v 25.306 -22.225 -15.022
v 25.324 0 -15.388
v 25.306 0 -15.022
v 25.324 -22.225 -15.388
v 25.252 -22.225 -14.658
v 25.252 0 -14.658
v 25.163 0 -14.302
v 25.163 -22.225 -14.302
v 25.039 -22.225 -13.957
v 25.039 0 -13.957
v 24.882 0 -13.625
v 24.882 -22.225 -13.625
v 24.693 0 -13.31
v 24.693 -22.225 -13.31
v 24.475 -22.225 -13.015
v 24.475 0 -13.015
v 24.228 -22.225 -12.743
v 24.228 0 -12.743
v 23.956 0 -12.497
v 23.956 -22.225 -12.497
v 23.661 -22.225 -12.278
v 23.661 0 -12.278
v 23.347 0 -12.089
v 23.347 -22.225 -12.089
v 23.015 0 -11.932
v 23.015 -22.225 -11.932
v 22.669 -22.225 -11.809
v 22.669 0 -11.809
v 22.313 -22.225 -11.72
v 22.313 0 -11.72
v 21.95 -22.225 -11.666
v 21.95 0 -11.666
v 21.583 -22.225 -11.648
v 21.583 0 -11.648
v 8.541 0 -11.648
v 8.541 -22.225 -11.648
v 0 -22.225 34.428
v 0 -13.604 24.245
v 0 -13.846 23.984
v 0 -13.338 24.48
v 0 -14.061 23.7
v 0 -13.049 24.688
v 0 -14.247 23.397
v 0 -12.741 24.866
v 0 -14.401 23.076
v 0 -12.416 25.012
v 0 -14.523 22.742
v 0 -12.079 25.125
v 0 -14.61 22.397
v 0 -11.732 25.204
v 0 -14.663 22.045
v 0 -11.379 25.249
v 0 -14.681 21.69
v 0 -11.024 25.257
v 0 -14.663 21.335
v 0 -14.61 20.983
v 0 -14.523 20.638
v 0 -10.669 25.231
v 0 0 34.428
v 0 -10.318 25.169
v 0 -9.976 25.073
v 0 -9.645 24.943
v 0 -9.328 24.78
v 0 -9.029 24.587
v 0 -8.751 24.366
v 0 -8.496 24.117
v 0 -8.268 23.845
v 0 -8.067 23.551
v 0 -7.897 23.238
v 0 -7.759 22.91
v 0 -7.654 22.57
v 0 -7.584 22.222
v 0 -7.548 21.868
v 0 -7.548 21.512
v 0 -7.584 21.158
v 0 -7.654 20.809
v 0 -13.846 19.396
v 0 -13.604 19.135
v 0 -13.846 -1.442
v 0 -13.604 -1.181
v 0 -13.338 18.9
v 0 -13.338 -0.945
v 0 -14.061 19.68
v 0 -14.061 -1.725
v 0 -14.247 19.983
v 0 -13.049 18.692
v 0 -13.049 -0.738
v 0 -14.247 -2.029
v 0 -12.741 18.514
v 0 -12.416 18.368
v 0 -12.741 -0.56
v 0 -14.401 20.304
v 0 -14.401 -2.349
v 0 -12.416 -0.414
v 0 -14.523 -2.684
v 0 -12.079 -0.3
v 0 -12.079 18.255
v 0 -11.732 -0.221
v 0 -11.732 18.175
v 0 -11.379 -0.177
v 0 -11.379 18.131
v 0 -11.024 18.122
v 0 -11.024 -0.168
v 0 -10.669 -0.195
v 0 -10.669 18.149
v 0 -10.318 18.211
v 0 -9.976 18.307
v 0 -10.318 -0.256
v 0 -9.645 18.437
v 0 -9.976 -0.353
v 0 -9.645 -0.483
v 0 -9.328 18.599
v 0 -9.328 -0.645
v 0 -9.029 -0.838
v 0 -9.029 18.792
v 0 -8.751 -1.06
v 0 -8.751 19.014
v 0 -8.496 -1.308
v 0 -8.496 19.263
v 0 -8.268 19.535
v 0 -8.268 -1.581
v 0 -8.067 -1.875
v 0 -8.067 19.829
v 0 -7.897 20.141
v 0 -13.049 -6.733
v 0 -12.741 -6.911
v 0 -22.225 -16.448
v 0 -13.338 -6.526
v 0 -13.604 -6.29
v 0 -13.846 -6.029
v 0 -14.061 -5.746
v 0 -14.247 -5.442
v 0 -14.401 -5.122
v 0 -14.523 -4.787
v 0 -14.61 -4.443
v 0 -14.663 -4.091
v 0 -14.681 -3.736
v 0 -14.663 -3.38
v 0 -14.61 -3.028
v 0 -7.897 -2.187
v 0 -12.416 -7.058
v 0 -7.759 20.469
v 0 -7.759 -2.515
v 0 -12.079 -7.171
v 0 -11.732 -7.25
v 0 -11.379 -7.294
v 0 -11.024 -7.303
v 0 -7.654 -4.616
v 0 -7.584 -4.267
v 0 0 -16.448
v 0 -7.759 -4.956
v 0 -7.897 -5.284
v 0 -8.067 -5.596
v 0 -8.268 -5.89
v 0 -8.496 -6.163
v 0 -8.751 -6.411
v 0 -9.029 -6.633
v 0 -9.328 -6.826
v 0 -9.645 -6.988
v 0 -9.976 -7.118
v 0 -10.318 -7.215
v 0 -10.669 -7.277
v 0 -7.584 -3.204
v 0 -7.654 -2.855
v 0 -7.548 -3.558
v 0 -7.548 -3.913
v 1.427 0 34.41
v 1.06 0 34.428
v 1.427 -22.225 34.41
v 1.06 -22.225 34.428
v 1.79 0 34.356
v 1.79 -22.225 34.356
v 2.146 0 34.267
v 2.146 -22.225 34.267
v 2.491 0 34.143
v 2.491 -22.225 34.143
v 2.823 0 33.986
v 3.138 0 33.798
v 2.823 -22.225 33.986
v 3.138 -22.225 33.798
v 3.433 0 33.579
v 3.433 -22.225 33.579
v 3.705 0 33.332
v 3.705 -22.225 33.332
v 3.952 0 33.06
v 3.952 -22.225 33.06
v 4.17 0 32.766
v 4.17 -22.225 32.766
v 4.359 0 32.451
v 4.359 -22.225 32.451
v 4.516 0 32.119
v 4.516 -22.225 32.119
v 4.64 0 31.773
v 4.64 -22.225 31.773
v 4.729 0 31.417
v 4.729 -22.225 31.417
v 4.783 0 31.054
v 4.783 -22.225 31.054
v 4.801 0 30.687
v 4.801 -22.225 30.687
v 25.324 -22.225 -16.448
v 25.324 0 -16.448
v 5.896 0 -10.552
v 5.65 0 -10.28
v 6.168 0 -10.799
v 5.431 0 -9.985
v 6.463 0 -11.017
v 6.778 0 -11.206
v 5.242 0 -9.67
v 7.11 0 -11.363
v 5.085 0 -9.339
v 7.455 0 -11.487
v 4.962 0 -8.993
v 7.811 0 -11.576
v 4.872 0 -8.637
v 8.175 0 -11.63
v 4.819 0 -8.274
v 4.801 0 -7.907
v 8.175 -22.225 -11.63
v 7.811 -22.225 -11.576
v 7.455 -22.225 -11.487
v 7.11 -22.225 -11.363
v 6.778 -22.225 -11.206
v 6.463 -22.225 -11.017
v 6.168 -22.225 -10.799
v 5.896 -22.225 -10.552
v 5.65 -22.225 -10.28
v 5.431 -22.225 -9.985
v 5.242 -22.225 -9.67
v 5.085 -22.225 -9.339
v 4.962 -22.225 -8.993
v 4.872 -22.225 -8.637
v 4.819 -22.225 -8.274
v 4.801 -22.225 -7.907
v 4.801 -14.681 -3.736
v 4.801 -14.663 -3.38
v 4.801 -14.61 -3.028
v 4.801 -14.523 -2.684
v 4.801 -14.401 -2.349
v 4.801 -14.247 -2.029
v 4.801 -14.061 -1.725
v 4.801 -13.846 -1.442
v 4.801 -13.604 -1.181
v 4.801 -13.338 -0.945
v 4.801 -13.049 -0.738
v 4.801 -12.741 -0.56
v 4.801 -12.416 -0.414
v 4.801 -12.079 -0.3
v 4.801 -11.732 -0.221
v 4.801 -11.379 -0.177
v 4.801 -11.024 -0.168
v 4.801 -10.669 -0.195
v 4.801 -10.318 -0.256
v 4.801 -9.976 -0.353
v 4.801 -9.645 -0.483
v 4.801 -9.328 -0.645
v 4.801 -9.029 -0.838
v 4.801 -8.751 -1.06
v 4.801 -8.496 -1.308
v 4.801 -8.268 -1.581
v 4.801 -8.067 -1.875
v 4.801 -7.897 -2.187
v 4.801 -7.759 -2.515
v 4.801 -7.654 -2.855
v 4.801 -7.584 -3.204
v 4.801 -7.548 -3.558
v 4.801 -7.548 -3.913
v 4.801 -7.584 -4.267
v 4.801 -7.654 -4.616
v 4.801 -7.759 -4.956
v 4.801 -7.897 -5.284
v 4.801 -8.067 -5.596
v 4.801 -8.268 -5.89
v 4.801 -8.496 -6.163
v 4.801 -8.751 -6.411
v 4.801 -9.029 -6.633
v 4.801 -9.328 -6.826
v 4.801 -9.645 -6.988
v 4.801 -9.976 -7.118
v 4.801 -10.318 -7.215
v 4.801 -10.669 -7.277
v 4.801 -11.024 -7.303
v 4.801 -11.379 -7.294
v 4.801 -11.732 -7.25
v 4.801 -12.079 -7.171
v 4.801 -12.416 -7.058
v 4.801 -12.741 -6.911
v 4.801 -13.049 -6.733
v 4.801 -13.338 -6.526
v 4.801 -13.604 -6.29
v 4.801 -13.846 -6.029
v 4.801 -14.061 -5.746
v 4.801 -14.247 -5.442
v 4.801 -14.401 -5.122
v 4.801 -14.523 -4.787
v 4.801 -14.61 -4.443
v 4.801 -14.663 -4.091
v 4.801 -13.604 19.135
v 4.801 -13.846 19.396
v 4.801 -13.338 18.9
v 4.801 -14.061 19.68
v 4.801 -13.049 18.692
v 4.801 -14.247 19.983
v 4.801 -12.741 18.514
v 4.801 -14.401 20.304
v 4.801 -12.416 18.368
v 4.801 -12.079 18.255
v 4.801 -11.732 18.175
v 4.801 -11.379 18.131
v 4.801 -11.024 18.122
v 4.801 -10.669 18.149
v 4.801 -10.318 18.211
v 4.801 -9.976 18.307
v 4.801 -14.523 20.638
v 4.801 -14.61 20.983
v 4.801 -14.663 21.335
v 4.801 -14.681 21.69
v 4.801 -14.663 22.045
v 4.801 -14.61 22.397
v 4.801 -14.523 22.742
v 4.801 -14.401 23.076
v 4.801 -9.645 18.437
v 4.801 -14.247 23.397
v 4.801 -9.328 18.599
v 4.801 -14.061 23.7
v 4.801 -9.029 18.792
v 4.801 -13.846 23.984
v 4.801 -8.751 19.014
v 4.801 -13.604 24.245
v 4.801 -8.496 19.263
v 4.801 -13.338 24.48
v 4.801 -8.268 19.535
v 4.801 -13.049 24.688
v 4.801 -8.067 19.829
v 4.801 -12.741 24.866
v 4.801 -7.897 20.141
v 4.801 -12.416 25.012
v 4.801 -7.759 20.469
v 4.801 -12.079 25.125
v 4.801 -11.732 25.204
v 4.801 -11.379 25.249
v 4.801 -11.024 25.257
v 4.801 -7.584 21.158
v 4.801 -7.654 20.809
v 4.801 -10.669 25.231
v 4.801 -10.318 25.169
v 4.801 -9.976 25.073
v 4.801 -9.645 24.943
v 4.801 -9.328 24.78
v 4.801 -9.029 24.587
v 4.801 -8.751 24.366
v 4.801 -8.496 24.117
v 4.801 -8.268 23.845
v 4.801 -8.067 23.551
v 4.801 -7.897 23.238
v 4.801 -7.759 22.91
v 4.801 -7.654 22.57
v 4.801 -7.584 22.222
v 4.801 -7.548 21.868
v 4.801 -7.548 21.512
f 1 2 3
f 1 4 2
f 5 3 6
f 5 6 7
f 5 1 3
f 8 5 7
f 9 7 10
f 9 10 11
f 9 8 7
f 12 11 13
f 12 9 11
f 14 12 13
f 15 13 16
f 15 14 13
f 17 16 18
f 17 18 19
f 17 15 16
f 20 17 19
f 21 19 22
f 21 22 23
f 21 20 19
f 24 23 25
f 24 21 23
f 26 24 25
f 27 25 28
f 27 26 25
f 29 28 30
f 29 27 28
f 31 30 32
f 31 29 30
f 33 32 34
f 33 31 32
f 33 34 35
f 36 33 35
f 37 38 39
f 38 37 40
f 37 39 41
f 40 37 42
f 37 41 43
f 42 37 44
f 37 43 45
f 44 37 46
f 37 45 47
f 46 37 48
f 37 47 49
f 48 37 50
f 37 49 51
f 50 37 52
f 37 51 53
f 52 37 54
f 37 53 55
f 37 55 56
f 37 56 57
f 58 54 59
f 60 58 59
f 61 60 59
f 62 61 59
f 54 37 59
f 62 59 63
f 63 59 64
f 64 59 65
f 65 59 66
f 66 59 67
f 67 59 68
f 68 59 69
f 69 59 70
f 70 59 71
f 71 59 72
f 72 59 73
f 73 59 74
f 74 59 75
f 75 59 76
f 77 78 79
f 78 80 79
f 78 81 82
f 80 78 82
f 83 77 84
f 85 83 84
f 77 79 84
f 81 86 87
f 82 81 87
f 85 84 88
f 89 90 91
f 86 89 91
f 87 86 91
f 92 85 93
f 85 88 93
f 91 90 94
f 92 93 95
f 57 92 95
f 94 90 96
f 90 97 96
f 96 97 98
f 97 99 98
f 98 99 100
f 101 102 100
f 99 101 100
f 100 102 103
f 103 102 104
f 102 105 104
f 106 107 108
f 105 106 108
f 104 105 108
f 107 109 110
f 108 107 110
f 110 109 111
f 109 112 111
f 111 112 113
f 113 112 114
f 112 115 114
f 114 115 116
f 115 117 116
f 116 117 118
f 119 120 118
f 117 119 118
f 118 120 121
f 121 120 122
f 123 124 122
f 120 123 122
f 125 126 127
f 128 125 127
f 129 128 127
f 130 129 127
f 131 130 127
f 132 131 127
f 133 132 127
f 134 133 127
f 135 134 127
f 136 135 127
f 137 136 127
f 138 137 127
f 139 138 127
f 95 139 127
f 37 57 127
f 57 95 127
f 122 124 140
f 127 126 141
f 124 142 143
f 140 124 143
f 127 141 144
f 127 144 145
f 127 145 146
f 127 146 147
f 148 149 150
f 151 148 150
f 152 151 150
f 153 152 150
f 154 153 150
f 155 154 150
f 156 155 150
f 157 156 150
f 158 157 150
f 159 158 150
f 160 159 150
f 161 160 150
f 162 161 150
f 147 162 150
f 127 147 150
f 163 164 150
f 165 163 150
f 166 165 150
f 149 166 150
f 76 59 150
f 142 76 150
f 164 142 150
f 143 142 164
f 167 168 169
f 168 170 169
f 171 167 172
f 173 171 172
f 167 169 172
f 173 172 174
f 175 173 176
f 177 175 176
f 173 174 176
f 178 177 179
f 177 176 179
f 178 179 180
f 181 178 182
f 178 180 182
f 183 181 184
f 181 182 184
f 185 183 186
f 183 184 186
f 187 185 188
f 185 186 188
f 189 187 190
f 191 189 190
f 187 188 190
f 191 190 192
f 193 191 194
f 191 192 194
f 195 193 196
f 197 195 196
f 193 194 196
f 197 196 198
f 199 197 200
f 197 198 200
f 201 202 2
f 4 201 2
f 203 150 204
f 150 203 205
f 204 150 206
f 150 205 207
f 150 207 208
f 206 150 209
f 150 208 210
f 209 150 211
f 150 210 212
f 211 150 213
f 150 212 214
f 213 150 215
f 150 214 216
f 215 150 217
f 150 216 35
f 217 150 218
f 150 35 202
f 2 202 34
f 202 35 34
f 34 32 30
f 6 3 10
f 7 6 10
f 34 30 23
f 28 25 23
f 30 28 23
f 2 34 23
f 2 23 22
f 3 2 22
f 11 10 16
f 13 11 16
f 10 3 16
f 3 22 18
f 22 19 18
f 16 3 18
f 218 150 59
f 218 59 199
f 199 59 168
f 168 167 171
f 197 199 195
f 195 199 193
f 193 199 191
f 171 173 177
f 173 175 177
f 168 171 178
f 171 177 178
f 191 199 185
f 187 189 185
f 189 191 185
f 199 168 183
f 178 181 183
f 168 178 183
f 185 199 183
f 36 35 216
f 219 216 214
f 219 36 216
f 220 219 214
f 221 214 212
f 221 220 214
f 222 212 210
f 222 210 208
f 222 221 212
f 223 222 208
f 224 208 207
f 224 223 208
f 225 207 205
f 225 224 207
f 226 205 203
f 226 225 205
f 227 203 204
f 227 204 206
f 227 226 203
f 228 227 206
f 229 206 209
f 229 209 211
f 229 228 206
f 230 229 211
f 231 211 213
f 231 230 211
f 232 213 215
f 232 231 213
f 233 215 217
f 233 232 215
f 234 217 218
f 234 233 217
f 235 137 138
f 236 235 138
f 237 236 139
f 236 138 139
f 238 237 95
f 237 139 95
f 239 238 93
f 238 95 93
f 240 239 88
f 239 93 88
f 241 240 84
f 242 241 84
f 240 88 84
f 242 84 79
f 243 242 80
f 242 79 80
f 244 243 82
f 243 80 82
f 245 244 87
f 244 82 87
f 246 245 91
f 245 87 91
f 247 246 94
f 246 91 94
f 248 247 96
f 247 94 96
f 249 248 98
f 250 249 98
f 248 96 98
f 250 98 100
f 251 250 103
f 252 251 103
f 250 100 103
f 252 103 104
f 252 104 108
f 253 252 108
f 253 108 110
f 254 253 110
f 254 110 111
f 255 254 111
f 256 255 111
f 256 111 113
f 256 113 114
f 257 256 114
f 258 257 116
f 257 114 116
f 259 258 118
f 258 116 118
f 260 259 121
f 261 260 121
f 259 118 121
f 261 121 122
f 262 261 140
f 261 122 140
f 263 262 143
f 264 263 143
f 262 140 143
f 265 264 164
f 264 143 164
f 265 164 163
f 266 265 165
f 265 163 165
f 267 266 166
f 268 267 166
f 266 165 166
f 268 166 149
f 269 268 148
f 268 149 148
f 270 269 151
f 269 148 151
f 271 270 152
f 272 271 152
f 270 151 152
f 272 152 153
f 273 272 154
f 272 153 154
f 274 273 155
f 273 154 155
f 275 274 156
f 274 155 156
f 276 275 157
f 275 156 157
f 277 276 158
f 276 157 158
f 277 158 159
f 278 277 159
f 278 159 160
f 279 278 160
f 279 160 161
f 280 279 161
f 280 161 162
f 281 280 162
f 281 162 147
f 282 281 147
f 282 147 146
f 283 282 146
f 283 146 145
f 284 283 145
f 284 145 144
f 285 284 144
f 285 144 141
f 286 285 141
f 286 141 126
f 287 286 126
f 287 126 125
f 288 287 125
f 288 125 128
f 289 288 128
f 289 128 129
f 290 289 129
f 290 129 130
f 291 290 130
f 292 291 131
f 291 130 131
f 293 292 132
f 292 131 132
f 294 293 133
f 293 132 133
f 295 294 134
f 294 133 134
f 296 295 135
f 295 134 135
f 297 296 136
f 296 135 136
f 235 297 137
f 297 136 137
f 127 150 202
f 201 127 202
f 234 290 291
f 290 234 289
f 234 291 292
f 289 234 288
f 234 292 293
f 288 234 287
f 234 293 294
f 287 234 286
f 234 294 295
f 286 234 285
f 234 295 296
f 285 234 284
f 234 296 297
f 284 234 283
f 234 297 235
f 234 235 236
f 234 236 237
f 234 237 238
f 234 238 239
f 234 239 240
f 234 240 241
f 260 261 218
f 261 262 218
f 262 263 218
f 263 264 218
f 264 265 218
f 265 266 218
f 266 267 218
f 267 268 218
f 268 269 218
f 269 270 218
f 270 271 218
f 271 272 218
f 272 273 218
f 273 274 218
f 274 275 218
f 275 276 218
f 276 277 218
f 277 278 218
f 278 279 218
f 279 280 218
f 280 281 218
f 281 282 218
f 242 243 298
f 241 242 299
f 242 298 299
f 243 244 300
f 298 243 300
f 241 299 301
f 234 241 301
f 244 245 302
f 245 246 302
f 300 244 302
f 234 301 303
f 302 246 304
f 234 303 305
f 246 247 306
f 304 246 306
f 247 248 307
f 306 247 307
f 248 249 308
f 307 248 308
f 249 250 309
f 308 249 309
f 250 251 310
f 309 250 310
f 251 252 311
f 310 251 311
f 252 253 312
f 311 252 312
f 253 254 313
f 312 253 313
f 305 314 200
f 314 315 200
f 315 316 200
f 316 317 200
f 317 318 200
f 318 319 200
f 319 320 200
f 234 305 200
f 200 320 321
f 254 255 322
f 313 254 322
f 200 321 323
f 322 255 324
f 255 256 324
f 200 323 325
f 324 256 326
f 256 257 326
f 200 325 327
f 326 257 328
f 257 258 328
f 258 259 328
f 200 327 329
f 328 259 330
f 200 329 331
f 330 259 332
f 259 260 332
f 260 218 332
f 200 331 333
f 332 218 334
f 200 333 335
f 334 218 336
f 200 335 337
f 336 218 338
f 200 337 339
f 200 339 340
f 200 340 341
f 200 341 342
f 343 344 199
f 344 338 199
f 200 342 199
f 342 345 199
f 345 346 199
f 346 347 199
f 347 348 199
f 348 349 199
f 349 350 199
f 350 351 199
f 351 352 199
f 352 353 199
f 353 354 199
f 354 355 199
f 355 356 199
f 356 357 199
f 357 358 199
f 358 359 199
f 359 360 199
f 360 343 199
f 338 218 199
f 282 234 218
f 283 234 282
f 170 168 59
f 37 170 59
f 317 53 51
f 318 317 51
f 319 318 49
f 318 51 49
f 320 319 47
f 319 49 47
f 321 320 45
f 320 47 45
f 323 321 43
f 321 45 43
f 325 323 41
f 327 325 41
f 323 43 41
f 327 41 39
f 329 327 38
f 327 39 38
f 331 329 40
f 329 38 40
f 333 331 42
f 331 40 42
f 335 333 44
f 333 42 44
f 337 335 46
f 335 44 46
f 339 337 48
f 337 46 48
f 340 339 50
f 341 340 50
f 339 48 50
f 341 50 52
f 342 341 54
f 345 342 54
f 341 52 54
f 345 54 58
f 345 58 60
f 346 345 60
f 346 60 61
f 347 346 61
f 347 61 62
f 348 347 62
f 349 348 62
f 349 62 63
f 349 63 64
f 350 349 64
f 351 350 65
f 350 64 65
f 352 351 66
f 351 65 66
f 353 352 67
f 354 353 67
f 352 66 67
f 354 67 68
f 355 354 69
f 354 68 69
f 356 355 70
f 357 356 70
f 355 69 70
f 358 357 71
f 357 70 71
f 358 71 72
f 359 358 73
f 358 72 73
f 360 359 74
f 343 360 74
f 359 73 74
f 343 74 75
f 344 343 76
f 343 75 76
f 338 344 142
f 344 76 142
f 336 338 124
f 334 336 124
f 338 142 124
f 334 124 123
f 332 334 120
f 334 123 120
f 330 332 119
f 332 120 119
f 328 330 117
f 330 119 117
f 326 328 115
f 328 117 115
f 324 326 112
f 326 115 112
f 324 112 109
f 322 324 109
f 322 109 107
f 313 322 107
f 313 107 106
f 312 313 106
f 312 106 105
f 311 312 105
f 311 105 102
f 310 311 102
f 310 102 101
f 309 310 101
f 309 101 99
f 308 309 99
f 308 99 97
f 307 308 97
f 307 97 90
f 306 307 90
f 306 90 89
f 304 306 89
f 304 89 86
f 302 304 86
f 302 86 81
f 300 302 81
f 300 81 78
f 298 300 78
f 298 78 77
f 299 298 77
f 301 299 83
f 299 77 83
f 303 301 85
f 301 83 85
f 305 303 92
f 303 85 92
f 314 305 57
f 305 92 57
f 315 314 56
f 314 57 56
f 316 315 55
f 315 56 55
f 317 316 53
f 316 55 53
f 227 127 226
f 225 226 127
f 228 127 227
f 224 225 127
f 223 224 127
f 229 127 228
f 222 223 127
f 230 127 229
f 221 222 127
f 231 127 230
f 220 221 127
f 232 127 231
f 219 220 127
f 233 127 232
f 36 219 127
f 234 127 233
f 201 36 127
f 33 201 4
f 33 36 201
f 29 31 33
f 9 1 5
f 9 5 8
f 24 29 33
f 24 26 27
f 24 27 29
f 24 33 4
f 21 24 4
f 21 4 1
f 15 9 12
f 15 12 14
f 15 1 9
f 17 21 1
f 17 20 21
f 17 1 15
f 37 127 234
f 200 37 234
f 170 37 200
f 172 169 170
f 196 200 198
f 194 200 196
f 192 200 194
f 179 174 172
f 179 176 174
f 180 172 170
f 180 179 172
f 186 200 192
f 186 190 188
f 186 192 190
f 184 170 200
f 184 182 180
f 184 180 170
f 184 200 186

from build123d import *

# Parameters (mm, degrees)
F1_DEPTH = 22.225
F2_R     = 3.740582
F3_R     = 3.5687
F4_DEPTH = 4.8006


with BuildPart() as f1:
    # F0 (on Front) → F1 (new body)
    with BuildSketch(Plane.XZ):
        Polygon((4.8006, 34.427944), (0, 34.427944), (0, -16.448256), (25.3238, -16.448256), (25.3238, -11.647656), (4.8006, -11.647656), align=None)
    extrude(amount=F1_DEPTH)

    # F2
    f2_edges = [f1.edges().sort_by_distance(p)[0] for p in [
        (4.8006, -11.1125, 34.427944),
        (4.8006, -11.1125, -11.647656),
        (25.3238, -11.1125, -11.647656),
    ]]
    fillet(f2_edges, radius=F2_R)

    # F3 (on face) → F4 (cut)
    with BuildSketch(Plane(origin=(0, 0, 0), x_dir=(0, -1, 0), z_dir=(-1, 0, 0))):
        with Locations((11.1125, 21.689844)):
            Circle(F3_R)
        with Locations((11.1125, -3.735556)):
            Circle(F3_R)
    extrude(amount=-F4_DEPTH, mode=Mode.SUBTRACT)


solid = f1.part
